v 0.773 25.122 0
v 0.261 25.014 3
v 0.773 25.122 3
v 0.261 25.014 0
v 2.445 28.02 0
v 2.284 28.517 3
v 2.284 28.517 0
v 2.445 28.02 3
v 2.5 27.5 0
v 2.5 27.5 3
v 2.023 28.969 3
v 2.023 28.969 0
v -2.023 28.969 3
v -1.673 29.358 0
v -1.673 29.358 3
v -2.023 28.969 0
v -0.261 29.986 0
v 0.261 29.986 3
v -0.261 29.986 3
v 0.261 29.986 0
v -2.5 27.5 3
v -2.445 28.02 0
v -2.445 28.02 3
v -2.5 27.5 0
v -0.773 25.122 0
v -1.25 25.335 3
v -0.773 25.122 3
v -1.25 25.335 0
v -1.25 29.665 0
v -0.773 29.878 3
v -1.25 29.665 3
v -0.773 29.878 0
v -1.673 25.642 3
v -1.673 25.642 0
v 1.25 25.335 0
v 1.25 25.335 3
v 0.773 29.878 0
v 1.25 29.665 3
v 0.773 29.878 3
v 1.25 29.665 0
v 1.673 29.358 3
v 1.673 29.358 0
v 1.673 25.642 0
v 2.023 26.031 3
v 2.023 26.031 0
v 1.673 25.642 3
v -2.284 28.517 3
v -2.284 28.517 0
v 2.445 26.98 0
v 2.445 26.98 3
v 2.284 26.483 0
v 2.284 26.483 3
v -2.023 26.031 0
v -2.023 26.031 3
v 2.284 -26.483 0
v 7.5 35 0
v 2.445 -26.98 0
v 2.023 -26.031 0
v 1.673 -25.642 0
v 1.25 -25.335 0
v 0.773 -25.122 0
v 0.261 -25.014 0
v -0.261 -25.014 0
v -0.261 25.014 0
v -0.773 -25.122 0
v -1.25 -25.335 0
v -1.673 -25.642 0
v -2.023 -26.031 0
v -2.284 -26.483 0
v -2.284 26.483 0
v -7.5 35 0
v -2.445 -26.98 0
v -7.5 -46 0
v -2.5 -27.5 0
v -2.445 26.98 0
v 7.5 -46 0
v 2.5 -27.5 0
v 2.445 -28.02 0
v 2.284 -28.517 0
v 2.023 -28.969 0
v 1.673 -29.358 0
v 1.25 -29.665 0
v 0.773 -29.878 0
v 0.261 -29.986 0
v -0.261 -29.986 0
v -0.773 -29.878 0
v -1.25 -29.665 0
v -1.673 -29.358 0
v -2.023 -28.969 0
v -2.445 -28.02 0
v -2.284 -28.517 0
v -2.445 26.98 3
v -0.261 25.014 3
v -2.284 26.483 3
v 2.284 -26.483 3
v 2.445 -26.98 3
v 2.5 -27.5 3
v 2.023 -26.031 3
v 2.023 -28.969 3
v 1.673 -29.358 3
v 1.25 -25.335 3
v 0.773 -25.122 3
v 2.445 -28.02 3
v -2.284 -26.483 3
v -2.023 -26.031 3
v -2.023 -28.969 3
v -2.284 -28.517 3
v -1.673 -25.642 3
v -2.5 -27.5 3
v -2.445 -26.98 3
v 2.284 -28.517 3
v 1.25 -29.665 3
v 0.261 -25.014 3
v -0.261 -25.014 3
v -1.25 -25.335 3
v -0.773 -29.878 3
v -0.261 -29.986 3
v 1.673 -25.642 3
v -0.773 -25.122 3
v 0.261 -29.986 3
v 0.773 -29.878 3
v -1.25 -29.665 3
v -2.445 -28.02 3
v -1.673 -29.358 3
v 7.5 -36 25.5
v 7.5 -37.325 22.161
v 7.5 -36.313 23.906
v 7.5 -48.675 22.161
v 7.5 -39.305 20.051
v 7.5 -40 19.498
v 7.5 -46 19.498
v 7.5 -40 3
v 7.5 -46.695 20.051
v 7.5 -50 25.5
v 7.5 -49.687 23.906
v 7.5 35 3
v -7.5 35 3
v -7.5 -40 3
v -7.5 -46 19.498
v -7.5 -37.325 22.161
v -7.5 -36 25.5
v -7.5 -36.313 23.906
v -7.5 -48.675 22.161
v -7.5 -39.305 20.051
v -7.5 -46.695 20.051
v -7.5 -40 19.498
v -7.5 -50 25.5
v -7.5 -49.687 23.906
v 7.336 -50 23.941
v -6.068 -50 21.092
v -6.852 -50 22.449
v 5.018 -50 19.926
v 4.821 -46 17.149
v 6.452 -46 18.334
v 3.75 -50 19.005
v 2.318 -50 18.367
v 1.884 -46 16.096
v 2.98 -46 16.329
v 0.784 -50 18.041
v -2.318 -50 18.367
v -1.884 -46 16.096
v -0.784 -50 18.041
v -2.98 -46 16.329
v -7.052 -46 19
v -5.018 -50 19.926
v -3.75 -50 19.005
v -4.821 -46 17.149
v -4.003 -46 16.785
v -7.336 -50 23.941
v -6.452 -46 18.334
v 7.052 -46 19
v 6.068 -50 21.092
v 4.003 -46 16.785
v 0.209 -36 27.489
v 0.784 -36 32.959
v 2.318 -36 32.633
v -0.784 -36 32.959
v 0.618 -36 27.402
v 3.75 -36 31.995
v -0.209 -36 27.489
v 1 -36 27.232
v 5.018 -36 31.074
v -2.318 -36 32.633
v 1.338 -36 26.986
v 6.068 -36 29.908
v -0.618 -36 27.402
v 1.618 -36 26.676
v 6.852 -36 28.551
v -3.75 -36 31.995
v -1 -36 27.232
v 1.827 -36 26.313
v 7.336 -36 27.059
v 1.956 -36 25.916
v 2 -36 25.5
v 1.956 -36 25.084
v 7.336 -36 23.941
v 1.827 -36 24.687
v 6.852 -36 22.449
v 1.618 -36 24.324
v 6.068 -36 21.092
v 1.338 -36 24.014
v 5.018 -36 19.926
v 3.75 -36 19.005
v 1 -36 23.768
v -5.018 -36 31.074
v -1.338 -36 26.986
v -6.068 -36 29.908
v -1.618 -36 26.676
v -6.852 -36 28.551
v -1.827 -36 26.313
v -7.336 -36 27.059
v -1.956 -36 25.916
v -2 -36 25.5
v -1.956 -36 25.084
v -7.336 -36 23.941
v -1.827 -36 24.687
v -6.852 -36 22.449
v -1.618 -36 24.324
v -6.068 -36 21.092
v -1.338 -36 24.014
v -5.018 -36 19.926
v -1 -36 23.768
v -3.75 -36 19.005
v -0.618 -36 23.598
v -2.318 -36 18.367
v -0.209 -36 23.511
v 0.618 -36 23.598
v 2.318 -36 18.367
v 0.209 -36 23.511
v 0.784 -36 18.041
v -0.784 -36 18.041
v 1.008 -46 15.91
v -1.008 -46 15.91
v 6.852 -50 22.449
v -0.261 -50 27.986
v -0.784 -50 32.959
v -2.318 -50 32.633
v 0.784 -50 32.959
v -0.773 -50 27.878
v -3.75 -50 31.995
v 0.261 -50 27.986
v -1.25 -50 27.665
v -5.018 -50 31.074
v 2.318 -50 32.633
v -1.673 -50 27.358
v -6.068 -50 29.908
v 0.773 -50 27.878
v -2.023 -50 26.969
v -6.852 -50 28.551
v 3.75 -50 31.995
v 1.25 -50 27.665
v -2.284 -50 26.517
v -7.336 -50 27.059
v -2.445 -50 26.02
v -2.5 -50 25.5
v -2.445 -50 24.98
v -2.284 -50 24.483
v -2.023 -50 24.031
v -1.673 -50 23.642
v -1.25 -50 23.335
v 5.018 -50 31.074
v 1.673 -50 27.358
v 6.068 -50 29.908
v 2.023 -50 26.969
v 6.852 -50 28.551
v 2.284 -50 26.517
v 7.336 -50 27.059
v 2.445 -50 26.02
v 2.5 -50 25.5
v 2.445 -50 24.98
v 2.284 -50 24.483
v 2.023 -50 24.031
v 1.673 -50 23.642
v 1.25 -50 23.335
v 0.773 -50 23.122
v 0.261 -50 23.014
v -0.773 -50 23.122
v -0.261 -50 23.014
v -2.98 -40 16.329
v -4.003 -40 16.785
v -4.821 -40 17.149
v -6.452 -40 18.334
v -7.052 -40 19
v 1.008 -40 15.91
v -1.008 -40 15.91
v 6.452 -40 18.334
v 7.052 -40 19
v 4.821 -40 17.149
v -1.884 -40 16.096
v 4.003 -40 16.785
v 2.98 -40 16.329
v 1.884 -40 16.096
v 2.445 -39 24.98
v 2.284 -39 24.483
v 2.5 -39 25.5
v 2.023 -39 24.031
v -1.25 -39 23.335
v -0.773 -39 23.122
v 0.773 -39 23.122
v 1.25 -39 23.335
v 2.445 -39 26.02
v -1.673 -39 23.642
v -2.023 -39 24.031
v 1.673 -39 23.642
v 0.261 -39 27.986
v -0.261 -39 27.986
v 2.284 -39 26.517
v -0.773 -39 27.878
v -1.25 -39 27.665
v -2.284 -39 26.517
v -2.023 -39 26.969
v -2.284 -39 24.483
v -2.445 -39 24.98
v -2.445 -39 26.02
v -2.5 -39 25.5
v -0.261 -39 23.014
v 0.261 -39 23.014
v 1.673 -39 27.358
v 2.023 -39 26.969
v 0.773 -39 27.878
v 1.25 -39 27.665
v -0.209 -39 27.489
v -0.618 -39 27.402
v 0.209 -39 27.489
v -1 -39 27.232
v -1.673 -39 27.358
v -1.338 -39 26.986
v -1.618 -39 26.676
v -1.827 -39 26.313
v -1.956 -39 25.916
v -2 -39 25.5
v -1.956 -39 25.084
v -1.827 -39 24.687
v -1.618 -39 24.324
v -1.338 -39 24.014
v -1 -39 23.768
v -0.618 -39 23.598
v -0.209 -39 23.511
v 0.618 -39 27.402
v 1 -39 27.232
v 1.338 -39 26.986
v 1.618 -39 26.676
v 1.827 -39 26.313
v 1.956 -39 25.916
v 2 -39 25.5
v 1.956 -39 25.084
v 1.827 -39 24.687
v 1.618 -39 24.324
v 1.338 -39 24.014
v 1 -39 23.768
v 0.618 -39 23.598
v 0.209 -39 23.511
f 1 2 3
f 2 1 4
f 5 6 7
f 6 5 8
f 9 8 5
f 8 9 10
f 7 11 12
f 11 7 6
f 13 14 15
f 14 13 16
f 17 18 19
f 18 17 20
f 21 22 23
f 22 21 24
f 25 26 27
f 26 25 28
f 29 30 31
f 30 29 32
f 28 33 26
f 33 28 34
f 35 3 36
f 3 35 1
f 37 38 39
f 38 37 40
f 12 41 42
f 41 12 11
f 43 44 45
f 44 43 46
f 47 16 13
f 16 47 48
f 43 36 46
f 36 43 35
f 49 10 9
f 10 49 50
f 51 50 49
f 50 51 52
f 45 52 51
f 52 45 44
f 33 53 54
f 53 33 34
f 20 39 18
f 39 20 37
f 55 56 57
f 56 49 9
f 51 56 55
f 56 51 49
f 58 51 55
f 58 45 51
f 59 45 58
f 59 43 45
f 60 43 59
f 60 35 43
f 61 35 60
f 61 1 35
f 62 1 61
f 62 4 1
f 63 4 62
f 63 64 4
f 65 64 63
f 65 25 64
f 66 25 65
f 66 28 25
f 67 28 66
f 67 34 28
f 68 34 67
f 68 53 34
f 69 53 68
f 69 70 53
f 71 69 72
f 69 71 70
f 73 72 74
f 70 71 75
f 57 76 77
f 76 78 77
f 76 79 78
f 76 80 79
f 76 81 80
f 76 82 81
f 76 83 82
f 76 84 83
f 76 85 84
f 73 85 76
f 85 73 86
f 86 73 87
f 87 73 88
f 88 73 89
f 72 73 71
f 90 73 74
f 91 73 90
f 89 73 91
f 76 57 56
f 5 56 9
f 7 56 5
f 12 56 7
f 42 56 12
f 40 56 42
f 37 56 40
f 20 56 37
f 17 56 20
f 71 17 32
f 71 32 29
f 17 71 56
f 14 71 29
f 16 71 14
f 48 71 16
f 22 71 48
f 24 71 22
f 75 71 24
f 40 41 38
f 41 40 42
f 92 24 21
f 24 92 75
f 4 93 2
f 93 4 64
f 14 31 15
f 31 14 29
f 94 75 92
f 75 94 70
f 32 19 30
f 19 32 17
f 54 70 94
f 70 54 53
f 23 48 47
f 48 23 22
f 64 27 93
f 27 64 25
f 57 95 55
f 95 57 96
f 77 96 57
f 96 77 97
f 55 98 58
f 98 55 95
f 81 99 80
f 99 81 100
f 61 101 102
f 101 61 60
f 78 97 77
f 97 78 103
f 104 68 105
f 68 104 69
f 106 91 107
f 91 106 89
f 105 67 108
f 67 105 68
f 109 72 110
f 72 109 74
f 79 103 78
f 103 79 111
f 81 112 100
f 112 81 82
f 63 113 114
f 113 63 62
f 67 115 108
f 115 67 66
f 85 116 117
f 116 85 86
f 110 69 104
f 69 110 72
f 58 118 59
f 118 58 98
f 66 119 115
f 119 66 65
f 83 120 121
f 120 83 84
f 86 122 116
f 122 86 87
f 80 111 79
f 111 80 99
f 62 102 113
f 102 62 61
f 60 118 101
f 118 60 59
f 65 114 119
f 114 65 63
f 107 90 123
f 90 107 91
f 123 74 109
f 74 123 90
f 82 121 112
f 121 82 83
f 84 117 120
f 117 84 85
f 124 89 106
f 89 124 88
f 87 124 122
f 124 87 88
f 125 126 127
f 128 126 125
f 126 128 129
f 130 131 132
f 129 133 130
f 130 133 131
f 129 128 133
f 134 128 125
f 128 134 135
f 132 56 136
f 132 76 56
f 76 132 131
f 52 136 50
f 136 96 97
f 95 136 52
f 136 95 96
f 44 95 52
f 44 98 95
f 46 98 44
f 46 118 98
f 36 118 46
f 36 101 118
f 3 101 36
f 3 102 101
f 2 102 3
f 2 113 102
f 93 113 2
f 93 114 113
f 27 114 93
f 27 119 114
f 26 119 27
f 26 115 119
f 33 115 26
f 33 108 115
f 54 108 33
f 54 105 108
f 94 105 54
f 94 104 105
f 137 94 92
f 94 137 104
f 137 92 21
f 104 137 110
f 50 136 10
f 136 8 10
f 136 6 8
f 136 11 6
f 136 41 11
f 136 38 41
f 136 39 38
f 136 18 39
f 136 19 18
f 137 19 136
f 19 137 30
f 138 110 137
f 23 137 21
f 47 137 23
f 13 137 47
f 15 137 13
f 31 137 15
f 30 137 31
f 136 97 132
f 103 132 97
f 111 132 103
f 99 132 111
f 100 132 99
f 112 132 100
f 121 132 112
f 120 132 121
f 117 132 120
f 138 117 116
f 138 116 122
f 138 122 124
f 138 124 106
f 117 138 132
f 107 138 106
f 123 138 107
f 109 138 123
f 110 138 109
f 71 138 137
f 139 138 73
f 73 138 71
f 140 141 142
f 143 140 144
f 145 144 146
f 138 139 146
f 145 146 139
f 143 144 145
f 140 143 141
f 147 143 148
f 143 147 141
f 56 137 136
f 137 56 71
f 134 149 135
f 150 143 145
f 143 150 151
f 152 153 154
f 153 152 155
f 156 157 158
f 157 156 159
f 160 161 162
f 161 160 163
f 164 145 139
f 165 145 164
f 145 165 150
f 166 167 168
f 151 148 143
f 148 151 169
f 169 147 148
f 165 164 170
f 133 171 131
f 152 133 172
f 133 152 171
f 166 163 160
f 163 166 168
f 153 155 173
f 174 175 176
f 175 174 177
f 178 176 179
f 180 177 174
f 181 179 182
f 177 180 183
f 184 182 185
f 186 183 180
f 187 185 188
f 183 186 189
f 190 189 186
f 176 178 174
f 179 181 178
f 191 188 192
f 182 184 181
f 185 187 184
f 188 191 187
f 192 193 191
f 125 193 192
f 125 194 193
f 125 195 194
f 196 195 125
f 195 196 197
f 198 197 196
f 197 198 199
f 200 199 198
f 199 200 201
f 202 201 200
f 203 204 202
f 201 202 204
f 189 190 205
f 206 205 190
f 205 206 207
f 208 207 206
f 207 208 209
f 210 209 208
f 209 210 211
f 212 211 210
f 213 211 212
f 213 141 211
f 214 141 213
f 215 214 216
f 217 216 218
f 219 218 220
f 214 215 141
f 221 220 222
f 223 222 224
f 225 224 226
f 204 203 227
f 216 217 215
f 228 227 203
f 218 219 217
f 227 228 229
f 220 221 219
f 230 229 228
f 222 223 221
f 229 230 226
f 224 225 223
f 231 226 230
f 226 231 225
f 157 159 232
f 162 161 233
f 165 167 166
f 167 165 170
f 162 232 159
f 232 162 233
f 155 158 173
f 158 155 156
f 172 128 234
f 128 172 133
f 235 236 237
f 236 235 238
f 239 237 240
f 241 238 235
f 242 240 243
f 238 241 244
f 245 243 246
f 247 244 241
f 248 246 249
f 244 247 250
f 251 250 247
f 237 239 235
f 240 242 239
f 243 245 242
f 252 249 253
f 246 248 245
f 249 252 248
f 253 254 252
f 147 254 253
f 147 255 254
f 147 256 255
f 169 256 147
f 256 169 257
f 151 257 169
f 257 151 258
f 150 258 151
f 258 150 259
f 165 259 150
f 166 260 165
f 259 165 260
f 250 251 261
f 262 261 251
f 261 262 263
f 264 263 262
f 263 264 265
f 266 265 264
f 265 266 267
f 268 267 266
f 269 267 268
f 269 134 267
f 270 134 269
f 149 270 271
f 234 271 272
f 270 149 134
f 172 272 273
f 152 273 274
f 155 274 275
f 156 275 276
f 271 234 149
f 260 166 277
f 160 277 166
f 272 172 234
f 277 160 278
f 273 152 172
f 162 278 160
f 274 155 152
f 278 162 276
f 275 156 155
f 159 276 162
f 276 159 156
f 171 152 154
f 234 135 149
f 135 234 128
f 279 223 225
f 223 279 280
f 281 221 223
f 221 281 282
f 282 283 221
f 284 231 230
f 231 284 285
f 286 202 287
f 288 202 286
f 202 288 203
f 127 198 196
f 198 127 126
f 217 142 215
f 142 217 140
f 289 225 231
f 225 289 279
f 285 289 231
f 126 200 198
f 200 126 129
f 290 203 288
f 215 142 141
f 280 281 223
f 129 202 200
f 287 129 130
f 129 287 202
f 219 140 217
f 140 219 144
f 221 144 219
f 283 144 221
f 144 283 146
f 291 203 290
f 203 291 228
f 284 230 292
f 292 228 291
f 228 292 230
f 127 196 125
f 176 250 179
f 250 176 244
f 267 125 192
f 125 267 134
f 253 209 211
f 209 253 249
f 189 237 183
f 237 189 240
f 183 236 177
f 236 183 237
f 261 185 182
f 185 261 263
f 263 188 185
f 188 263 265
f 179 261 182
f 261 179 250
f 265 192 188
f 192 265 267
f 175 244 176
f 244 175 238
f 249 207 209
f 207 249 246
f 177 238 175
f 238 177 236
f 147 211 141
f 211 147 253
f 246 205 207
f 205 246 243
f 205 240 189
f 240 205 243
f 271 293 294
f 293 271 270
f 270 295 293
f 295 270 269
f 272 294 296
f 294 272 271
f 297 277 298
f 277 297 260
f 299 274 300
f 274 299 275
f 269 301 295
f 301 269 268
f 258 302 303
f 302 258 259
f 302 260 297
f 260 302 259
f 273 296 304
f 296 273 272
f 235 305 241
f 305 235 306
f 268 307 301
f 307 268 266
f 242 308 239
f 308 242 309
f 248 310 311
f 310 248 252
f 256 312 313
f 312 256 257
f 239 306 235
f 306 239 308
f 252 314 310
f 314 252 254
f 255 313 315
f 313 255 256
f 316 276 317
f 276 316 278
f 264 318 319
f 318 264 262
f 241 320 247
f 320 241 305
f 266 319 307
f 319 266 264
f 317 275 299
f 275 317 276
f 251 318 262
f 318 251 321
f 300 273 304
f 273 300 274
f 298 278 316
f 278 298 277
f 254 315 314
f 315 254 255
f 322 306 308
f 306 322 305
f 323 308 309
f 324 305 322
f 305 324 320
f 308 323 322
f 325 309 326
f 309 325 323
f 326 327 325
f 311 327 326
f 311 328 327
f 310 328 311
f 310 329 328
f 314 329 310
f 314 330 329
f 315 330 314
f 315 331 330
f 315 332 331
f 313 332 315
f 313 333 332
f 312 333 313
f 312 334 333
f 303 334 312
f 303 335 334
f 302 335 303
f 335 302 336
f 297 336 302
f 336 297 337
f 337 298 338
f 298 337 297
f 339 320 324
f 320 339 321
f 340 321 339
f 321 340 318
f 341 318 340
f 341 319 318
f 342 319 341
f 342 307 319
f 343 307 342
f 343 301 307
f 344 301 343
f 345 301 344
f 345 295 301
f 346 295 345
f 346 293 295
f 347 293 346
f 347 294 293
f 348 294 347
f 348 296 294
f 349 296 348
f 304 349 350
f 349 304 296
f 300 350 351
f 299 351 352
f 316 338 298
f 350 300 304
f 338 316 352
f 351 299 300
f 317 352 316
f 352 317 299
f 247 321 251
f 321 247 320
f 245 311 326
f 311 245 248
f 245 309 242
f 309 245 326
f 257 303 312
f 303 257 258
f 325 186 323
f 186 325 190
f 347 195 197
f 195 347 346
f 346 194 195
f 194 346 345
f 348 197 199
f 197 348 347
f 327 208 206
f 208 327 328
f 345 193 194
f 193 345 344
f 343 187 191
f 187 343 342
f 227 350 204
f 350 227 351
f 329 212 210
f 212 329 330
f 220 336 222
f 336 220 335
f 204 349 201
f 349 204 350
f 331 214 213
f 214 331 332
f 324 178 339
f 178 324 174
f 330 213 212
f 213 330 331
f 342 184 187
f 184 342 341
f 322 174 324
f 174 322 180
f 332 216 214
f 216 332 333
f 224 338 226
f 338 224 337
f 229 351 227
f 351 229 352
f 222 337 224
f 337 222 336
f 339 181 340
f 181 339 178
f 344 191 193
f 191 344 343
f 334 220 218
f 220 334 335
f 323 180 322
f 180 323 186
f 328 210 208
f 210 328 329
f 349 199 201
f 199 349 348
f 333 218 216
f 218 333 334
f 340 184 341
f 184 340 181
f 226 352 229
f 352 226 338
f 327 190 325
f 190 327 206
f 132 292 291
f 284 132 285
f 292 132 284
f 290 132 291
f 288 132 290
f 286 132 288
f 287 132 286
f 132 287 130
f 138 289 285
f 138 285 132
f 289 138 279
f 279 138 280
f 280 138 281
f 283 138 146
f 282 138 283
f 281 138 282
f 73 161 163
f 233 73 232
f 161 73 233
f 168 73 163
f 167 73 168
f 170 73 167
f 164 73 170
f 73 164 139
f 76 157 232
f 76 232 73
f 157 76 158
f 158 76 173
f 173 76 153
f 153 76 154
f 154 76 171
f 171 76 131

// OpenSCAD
// create a spacer for the new brass extruder assembly

// 15x70x3
length = 70;
hole_space=55;
hole_size=5;

feedBottomLength = 5;

feedVerticalHeight = 18;
feedVerticalLength = 6;
verticalYpos = -1*(feedBottomLength+feedVerticalLength+length/2);

// bottom section with holes
difference() {
    translate([-7.5,-1*(length/2),0])
    cube([15,length,3]);

    union() {
        translate([0, 1*(length/2-((length-hole_space)/2)),0])
        cylinder(d=hole_size,h=4,center=false, $fs=0.1);
        
        translate([0,-1*(length/2-((length-hole_space)/2)),0])
        cylinder(d=hole_size,h=4,center=false, $fs=0.1);
    }
}

// extra spacer
translate([-7.5,-1*(feedBottomLength+length/2),0])
cube([15,feedBottomLength,3]);

// vertical bar of feeder
translate([-7.5,verticalYpos,0])
cube([15,feedVerticalLength,feedVerticalHeight+2]);

// rounded part with hole
translate([0,verticalYpos-4,feedVerticalHeight])
translate([0,0,15/2])
rotate([-90,0,0])
difference() {
    union() {
        cylinder(r=15/2,h=feedVerticalLength+8, $fs=0.01);
        //translate([-7.5,0,0])
        //cube([15,15/2,feedVerticalLength]);

        intersection() {
            cylinder(r2=15,r1=15/2,h=feedVerticalLength+8);
            cylinder(r2=15/2,r1=15,h=feedVerticalLength+8);
            translate([-7.5,0,0])
            cube([15,15,feedVerticalLength+8]);
        }
    }
    union() {
        cylinder(r=5/2,h=feedVerticalLength+8-3, $fs=0.1);
        cylinder(r=2,h=feedVerticalLength+8, $fs=0.1);
    }
}
